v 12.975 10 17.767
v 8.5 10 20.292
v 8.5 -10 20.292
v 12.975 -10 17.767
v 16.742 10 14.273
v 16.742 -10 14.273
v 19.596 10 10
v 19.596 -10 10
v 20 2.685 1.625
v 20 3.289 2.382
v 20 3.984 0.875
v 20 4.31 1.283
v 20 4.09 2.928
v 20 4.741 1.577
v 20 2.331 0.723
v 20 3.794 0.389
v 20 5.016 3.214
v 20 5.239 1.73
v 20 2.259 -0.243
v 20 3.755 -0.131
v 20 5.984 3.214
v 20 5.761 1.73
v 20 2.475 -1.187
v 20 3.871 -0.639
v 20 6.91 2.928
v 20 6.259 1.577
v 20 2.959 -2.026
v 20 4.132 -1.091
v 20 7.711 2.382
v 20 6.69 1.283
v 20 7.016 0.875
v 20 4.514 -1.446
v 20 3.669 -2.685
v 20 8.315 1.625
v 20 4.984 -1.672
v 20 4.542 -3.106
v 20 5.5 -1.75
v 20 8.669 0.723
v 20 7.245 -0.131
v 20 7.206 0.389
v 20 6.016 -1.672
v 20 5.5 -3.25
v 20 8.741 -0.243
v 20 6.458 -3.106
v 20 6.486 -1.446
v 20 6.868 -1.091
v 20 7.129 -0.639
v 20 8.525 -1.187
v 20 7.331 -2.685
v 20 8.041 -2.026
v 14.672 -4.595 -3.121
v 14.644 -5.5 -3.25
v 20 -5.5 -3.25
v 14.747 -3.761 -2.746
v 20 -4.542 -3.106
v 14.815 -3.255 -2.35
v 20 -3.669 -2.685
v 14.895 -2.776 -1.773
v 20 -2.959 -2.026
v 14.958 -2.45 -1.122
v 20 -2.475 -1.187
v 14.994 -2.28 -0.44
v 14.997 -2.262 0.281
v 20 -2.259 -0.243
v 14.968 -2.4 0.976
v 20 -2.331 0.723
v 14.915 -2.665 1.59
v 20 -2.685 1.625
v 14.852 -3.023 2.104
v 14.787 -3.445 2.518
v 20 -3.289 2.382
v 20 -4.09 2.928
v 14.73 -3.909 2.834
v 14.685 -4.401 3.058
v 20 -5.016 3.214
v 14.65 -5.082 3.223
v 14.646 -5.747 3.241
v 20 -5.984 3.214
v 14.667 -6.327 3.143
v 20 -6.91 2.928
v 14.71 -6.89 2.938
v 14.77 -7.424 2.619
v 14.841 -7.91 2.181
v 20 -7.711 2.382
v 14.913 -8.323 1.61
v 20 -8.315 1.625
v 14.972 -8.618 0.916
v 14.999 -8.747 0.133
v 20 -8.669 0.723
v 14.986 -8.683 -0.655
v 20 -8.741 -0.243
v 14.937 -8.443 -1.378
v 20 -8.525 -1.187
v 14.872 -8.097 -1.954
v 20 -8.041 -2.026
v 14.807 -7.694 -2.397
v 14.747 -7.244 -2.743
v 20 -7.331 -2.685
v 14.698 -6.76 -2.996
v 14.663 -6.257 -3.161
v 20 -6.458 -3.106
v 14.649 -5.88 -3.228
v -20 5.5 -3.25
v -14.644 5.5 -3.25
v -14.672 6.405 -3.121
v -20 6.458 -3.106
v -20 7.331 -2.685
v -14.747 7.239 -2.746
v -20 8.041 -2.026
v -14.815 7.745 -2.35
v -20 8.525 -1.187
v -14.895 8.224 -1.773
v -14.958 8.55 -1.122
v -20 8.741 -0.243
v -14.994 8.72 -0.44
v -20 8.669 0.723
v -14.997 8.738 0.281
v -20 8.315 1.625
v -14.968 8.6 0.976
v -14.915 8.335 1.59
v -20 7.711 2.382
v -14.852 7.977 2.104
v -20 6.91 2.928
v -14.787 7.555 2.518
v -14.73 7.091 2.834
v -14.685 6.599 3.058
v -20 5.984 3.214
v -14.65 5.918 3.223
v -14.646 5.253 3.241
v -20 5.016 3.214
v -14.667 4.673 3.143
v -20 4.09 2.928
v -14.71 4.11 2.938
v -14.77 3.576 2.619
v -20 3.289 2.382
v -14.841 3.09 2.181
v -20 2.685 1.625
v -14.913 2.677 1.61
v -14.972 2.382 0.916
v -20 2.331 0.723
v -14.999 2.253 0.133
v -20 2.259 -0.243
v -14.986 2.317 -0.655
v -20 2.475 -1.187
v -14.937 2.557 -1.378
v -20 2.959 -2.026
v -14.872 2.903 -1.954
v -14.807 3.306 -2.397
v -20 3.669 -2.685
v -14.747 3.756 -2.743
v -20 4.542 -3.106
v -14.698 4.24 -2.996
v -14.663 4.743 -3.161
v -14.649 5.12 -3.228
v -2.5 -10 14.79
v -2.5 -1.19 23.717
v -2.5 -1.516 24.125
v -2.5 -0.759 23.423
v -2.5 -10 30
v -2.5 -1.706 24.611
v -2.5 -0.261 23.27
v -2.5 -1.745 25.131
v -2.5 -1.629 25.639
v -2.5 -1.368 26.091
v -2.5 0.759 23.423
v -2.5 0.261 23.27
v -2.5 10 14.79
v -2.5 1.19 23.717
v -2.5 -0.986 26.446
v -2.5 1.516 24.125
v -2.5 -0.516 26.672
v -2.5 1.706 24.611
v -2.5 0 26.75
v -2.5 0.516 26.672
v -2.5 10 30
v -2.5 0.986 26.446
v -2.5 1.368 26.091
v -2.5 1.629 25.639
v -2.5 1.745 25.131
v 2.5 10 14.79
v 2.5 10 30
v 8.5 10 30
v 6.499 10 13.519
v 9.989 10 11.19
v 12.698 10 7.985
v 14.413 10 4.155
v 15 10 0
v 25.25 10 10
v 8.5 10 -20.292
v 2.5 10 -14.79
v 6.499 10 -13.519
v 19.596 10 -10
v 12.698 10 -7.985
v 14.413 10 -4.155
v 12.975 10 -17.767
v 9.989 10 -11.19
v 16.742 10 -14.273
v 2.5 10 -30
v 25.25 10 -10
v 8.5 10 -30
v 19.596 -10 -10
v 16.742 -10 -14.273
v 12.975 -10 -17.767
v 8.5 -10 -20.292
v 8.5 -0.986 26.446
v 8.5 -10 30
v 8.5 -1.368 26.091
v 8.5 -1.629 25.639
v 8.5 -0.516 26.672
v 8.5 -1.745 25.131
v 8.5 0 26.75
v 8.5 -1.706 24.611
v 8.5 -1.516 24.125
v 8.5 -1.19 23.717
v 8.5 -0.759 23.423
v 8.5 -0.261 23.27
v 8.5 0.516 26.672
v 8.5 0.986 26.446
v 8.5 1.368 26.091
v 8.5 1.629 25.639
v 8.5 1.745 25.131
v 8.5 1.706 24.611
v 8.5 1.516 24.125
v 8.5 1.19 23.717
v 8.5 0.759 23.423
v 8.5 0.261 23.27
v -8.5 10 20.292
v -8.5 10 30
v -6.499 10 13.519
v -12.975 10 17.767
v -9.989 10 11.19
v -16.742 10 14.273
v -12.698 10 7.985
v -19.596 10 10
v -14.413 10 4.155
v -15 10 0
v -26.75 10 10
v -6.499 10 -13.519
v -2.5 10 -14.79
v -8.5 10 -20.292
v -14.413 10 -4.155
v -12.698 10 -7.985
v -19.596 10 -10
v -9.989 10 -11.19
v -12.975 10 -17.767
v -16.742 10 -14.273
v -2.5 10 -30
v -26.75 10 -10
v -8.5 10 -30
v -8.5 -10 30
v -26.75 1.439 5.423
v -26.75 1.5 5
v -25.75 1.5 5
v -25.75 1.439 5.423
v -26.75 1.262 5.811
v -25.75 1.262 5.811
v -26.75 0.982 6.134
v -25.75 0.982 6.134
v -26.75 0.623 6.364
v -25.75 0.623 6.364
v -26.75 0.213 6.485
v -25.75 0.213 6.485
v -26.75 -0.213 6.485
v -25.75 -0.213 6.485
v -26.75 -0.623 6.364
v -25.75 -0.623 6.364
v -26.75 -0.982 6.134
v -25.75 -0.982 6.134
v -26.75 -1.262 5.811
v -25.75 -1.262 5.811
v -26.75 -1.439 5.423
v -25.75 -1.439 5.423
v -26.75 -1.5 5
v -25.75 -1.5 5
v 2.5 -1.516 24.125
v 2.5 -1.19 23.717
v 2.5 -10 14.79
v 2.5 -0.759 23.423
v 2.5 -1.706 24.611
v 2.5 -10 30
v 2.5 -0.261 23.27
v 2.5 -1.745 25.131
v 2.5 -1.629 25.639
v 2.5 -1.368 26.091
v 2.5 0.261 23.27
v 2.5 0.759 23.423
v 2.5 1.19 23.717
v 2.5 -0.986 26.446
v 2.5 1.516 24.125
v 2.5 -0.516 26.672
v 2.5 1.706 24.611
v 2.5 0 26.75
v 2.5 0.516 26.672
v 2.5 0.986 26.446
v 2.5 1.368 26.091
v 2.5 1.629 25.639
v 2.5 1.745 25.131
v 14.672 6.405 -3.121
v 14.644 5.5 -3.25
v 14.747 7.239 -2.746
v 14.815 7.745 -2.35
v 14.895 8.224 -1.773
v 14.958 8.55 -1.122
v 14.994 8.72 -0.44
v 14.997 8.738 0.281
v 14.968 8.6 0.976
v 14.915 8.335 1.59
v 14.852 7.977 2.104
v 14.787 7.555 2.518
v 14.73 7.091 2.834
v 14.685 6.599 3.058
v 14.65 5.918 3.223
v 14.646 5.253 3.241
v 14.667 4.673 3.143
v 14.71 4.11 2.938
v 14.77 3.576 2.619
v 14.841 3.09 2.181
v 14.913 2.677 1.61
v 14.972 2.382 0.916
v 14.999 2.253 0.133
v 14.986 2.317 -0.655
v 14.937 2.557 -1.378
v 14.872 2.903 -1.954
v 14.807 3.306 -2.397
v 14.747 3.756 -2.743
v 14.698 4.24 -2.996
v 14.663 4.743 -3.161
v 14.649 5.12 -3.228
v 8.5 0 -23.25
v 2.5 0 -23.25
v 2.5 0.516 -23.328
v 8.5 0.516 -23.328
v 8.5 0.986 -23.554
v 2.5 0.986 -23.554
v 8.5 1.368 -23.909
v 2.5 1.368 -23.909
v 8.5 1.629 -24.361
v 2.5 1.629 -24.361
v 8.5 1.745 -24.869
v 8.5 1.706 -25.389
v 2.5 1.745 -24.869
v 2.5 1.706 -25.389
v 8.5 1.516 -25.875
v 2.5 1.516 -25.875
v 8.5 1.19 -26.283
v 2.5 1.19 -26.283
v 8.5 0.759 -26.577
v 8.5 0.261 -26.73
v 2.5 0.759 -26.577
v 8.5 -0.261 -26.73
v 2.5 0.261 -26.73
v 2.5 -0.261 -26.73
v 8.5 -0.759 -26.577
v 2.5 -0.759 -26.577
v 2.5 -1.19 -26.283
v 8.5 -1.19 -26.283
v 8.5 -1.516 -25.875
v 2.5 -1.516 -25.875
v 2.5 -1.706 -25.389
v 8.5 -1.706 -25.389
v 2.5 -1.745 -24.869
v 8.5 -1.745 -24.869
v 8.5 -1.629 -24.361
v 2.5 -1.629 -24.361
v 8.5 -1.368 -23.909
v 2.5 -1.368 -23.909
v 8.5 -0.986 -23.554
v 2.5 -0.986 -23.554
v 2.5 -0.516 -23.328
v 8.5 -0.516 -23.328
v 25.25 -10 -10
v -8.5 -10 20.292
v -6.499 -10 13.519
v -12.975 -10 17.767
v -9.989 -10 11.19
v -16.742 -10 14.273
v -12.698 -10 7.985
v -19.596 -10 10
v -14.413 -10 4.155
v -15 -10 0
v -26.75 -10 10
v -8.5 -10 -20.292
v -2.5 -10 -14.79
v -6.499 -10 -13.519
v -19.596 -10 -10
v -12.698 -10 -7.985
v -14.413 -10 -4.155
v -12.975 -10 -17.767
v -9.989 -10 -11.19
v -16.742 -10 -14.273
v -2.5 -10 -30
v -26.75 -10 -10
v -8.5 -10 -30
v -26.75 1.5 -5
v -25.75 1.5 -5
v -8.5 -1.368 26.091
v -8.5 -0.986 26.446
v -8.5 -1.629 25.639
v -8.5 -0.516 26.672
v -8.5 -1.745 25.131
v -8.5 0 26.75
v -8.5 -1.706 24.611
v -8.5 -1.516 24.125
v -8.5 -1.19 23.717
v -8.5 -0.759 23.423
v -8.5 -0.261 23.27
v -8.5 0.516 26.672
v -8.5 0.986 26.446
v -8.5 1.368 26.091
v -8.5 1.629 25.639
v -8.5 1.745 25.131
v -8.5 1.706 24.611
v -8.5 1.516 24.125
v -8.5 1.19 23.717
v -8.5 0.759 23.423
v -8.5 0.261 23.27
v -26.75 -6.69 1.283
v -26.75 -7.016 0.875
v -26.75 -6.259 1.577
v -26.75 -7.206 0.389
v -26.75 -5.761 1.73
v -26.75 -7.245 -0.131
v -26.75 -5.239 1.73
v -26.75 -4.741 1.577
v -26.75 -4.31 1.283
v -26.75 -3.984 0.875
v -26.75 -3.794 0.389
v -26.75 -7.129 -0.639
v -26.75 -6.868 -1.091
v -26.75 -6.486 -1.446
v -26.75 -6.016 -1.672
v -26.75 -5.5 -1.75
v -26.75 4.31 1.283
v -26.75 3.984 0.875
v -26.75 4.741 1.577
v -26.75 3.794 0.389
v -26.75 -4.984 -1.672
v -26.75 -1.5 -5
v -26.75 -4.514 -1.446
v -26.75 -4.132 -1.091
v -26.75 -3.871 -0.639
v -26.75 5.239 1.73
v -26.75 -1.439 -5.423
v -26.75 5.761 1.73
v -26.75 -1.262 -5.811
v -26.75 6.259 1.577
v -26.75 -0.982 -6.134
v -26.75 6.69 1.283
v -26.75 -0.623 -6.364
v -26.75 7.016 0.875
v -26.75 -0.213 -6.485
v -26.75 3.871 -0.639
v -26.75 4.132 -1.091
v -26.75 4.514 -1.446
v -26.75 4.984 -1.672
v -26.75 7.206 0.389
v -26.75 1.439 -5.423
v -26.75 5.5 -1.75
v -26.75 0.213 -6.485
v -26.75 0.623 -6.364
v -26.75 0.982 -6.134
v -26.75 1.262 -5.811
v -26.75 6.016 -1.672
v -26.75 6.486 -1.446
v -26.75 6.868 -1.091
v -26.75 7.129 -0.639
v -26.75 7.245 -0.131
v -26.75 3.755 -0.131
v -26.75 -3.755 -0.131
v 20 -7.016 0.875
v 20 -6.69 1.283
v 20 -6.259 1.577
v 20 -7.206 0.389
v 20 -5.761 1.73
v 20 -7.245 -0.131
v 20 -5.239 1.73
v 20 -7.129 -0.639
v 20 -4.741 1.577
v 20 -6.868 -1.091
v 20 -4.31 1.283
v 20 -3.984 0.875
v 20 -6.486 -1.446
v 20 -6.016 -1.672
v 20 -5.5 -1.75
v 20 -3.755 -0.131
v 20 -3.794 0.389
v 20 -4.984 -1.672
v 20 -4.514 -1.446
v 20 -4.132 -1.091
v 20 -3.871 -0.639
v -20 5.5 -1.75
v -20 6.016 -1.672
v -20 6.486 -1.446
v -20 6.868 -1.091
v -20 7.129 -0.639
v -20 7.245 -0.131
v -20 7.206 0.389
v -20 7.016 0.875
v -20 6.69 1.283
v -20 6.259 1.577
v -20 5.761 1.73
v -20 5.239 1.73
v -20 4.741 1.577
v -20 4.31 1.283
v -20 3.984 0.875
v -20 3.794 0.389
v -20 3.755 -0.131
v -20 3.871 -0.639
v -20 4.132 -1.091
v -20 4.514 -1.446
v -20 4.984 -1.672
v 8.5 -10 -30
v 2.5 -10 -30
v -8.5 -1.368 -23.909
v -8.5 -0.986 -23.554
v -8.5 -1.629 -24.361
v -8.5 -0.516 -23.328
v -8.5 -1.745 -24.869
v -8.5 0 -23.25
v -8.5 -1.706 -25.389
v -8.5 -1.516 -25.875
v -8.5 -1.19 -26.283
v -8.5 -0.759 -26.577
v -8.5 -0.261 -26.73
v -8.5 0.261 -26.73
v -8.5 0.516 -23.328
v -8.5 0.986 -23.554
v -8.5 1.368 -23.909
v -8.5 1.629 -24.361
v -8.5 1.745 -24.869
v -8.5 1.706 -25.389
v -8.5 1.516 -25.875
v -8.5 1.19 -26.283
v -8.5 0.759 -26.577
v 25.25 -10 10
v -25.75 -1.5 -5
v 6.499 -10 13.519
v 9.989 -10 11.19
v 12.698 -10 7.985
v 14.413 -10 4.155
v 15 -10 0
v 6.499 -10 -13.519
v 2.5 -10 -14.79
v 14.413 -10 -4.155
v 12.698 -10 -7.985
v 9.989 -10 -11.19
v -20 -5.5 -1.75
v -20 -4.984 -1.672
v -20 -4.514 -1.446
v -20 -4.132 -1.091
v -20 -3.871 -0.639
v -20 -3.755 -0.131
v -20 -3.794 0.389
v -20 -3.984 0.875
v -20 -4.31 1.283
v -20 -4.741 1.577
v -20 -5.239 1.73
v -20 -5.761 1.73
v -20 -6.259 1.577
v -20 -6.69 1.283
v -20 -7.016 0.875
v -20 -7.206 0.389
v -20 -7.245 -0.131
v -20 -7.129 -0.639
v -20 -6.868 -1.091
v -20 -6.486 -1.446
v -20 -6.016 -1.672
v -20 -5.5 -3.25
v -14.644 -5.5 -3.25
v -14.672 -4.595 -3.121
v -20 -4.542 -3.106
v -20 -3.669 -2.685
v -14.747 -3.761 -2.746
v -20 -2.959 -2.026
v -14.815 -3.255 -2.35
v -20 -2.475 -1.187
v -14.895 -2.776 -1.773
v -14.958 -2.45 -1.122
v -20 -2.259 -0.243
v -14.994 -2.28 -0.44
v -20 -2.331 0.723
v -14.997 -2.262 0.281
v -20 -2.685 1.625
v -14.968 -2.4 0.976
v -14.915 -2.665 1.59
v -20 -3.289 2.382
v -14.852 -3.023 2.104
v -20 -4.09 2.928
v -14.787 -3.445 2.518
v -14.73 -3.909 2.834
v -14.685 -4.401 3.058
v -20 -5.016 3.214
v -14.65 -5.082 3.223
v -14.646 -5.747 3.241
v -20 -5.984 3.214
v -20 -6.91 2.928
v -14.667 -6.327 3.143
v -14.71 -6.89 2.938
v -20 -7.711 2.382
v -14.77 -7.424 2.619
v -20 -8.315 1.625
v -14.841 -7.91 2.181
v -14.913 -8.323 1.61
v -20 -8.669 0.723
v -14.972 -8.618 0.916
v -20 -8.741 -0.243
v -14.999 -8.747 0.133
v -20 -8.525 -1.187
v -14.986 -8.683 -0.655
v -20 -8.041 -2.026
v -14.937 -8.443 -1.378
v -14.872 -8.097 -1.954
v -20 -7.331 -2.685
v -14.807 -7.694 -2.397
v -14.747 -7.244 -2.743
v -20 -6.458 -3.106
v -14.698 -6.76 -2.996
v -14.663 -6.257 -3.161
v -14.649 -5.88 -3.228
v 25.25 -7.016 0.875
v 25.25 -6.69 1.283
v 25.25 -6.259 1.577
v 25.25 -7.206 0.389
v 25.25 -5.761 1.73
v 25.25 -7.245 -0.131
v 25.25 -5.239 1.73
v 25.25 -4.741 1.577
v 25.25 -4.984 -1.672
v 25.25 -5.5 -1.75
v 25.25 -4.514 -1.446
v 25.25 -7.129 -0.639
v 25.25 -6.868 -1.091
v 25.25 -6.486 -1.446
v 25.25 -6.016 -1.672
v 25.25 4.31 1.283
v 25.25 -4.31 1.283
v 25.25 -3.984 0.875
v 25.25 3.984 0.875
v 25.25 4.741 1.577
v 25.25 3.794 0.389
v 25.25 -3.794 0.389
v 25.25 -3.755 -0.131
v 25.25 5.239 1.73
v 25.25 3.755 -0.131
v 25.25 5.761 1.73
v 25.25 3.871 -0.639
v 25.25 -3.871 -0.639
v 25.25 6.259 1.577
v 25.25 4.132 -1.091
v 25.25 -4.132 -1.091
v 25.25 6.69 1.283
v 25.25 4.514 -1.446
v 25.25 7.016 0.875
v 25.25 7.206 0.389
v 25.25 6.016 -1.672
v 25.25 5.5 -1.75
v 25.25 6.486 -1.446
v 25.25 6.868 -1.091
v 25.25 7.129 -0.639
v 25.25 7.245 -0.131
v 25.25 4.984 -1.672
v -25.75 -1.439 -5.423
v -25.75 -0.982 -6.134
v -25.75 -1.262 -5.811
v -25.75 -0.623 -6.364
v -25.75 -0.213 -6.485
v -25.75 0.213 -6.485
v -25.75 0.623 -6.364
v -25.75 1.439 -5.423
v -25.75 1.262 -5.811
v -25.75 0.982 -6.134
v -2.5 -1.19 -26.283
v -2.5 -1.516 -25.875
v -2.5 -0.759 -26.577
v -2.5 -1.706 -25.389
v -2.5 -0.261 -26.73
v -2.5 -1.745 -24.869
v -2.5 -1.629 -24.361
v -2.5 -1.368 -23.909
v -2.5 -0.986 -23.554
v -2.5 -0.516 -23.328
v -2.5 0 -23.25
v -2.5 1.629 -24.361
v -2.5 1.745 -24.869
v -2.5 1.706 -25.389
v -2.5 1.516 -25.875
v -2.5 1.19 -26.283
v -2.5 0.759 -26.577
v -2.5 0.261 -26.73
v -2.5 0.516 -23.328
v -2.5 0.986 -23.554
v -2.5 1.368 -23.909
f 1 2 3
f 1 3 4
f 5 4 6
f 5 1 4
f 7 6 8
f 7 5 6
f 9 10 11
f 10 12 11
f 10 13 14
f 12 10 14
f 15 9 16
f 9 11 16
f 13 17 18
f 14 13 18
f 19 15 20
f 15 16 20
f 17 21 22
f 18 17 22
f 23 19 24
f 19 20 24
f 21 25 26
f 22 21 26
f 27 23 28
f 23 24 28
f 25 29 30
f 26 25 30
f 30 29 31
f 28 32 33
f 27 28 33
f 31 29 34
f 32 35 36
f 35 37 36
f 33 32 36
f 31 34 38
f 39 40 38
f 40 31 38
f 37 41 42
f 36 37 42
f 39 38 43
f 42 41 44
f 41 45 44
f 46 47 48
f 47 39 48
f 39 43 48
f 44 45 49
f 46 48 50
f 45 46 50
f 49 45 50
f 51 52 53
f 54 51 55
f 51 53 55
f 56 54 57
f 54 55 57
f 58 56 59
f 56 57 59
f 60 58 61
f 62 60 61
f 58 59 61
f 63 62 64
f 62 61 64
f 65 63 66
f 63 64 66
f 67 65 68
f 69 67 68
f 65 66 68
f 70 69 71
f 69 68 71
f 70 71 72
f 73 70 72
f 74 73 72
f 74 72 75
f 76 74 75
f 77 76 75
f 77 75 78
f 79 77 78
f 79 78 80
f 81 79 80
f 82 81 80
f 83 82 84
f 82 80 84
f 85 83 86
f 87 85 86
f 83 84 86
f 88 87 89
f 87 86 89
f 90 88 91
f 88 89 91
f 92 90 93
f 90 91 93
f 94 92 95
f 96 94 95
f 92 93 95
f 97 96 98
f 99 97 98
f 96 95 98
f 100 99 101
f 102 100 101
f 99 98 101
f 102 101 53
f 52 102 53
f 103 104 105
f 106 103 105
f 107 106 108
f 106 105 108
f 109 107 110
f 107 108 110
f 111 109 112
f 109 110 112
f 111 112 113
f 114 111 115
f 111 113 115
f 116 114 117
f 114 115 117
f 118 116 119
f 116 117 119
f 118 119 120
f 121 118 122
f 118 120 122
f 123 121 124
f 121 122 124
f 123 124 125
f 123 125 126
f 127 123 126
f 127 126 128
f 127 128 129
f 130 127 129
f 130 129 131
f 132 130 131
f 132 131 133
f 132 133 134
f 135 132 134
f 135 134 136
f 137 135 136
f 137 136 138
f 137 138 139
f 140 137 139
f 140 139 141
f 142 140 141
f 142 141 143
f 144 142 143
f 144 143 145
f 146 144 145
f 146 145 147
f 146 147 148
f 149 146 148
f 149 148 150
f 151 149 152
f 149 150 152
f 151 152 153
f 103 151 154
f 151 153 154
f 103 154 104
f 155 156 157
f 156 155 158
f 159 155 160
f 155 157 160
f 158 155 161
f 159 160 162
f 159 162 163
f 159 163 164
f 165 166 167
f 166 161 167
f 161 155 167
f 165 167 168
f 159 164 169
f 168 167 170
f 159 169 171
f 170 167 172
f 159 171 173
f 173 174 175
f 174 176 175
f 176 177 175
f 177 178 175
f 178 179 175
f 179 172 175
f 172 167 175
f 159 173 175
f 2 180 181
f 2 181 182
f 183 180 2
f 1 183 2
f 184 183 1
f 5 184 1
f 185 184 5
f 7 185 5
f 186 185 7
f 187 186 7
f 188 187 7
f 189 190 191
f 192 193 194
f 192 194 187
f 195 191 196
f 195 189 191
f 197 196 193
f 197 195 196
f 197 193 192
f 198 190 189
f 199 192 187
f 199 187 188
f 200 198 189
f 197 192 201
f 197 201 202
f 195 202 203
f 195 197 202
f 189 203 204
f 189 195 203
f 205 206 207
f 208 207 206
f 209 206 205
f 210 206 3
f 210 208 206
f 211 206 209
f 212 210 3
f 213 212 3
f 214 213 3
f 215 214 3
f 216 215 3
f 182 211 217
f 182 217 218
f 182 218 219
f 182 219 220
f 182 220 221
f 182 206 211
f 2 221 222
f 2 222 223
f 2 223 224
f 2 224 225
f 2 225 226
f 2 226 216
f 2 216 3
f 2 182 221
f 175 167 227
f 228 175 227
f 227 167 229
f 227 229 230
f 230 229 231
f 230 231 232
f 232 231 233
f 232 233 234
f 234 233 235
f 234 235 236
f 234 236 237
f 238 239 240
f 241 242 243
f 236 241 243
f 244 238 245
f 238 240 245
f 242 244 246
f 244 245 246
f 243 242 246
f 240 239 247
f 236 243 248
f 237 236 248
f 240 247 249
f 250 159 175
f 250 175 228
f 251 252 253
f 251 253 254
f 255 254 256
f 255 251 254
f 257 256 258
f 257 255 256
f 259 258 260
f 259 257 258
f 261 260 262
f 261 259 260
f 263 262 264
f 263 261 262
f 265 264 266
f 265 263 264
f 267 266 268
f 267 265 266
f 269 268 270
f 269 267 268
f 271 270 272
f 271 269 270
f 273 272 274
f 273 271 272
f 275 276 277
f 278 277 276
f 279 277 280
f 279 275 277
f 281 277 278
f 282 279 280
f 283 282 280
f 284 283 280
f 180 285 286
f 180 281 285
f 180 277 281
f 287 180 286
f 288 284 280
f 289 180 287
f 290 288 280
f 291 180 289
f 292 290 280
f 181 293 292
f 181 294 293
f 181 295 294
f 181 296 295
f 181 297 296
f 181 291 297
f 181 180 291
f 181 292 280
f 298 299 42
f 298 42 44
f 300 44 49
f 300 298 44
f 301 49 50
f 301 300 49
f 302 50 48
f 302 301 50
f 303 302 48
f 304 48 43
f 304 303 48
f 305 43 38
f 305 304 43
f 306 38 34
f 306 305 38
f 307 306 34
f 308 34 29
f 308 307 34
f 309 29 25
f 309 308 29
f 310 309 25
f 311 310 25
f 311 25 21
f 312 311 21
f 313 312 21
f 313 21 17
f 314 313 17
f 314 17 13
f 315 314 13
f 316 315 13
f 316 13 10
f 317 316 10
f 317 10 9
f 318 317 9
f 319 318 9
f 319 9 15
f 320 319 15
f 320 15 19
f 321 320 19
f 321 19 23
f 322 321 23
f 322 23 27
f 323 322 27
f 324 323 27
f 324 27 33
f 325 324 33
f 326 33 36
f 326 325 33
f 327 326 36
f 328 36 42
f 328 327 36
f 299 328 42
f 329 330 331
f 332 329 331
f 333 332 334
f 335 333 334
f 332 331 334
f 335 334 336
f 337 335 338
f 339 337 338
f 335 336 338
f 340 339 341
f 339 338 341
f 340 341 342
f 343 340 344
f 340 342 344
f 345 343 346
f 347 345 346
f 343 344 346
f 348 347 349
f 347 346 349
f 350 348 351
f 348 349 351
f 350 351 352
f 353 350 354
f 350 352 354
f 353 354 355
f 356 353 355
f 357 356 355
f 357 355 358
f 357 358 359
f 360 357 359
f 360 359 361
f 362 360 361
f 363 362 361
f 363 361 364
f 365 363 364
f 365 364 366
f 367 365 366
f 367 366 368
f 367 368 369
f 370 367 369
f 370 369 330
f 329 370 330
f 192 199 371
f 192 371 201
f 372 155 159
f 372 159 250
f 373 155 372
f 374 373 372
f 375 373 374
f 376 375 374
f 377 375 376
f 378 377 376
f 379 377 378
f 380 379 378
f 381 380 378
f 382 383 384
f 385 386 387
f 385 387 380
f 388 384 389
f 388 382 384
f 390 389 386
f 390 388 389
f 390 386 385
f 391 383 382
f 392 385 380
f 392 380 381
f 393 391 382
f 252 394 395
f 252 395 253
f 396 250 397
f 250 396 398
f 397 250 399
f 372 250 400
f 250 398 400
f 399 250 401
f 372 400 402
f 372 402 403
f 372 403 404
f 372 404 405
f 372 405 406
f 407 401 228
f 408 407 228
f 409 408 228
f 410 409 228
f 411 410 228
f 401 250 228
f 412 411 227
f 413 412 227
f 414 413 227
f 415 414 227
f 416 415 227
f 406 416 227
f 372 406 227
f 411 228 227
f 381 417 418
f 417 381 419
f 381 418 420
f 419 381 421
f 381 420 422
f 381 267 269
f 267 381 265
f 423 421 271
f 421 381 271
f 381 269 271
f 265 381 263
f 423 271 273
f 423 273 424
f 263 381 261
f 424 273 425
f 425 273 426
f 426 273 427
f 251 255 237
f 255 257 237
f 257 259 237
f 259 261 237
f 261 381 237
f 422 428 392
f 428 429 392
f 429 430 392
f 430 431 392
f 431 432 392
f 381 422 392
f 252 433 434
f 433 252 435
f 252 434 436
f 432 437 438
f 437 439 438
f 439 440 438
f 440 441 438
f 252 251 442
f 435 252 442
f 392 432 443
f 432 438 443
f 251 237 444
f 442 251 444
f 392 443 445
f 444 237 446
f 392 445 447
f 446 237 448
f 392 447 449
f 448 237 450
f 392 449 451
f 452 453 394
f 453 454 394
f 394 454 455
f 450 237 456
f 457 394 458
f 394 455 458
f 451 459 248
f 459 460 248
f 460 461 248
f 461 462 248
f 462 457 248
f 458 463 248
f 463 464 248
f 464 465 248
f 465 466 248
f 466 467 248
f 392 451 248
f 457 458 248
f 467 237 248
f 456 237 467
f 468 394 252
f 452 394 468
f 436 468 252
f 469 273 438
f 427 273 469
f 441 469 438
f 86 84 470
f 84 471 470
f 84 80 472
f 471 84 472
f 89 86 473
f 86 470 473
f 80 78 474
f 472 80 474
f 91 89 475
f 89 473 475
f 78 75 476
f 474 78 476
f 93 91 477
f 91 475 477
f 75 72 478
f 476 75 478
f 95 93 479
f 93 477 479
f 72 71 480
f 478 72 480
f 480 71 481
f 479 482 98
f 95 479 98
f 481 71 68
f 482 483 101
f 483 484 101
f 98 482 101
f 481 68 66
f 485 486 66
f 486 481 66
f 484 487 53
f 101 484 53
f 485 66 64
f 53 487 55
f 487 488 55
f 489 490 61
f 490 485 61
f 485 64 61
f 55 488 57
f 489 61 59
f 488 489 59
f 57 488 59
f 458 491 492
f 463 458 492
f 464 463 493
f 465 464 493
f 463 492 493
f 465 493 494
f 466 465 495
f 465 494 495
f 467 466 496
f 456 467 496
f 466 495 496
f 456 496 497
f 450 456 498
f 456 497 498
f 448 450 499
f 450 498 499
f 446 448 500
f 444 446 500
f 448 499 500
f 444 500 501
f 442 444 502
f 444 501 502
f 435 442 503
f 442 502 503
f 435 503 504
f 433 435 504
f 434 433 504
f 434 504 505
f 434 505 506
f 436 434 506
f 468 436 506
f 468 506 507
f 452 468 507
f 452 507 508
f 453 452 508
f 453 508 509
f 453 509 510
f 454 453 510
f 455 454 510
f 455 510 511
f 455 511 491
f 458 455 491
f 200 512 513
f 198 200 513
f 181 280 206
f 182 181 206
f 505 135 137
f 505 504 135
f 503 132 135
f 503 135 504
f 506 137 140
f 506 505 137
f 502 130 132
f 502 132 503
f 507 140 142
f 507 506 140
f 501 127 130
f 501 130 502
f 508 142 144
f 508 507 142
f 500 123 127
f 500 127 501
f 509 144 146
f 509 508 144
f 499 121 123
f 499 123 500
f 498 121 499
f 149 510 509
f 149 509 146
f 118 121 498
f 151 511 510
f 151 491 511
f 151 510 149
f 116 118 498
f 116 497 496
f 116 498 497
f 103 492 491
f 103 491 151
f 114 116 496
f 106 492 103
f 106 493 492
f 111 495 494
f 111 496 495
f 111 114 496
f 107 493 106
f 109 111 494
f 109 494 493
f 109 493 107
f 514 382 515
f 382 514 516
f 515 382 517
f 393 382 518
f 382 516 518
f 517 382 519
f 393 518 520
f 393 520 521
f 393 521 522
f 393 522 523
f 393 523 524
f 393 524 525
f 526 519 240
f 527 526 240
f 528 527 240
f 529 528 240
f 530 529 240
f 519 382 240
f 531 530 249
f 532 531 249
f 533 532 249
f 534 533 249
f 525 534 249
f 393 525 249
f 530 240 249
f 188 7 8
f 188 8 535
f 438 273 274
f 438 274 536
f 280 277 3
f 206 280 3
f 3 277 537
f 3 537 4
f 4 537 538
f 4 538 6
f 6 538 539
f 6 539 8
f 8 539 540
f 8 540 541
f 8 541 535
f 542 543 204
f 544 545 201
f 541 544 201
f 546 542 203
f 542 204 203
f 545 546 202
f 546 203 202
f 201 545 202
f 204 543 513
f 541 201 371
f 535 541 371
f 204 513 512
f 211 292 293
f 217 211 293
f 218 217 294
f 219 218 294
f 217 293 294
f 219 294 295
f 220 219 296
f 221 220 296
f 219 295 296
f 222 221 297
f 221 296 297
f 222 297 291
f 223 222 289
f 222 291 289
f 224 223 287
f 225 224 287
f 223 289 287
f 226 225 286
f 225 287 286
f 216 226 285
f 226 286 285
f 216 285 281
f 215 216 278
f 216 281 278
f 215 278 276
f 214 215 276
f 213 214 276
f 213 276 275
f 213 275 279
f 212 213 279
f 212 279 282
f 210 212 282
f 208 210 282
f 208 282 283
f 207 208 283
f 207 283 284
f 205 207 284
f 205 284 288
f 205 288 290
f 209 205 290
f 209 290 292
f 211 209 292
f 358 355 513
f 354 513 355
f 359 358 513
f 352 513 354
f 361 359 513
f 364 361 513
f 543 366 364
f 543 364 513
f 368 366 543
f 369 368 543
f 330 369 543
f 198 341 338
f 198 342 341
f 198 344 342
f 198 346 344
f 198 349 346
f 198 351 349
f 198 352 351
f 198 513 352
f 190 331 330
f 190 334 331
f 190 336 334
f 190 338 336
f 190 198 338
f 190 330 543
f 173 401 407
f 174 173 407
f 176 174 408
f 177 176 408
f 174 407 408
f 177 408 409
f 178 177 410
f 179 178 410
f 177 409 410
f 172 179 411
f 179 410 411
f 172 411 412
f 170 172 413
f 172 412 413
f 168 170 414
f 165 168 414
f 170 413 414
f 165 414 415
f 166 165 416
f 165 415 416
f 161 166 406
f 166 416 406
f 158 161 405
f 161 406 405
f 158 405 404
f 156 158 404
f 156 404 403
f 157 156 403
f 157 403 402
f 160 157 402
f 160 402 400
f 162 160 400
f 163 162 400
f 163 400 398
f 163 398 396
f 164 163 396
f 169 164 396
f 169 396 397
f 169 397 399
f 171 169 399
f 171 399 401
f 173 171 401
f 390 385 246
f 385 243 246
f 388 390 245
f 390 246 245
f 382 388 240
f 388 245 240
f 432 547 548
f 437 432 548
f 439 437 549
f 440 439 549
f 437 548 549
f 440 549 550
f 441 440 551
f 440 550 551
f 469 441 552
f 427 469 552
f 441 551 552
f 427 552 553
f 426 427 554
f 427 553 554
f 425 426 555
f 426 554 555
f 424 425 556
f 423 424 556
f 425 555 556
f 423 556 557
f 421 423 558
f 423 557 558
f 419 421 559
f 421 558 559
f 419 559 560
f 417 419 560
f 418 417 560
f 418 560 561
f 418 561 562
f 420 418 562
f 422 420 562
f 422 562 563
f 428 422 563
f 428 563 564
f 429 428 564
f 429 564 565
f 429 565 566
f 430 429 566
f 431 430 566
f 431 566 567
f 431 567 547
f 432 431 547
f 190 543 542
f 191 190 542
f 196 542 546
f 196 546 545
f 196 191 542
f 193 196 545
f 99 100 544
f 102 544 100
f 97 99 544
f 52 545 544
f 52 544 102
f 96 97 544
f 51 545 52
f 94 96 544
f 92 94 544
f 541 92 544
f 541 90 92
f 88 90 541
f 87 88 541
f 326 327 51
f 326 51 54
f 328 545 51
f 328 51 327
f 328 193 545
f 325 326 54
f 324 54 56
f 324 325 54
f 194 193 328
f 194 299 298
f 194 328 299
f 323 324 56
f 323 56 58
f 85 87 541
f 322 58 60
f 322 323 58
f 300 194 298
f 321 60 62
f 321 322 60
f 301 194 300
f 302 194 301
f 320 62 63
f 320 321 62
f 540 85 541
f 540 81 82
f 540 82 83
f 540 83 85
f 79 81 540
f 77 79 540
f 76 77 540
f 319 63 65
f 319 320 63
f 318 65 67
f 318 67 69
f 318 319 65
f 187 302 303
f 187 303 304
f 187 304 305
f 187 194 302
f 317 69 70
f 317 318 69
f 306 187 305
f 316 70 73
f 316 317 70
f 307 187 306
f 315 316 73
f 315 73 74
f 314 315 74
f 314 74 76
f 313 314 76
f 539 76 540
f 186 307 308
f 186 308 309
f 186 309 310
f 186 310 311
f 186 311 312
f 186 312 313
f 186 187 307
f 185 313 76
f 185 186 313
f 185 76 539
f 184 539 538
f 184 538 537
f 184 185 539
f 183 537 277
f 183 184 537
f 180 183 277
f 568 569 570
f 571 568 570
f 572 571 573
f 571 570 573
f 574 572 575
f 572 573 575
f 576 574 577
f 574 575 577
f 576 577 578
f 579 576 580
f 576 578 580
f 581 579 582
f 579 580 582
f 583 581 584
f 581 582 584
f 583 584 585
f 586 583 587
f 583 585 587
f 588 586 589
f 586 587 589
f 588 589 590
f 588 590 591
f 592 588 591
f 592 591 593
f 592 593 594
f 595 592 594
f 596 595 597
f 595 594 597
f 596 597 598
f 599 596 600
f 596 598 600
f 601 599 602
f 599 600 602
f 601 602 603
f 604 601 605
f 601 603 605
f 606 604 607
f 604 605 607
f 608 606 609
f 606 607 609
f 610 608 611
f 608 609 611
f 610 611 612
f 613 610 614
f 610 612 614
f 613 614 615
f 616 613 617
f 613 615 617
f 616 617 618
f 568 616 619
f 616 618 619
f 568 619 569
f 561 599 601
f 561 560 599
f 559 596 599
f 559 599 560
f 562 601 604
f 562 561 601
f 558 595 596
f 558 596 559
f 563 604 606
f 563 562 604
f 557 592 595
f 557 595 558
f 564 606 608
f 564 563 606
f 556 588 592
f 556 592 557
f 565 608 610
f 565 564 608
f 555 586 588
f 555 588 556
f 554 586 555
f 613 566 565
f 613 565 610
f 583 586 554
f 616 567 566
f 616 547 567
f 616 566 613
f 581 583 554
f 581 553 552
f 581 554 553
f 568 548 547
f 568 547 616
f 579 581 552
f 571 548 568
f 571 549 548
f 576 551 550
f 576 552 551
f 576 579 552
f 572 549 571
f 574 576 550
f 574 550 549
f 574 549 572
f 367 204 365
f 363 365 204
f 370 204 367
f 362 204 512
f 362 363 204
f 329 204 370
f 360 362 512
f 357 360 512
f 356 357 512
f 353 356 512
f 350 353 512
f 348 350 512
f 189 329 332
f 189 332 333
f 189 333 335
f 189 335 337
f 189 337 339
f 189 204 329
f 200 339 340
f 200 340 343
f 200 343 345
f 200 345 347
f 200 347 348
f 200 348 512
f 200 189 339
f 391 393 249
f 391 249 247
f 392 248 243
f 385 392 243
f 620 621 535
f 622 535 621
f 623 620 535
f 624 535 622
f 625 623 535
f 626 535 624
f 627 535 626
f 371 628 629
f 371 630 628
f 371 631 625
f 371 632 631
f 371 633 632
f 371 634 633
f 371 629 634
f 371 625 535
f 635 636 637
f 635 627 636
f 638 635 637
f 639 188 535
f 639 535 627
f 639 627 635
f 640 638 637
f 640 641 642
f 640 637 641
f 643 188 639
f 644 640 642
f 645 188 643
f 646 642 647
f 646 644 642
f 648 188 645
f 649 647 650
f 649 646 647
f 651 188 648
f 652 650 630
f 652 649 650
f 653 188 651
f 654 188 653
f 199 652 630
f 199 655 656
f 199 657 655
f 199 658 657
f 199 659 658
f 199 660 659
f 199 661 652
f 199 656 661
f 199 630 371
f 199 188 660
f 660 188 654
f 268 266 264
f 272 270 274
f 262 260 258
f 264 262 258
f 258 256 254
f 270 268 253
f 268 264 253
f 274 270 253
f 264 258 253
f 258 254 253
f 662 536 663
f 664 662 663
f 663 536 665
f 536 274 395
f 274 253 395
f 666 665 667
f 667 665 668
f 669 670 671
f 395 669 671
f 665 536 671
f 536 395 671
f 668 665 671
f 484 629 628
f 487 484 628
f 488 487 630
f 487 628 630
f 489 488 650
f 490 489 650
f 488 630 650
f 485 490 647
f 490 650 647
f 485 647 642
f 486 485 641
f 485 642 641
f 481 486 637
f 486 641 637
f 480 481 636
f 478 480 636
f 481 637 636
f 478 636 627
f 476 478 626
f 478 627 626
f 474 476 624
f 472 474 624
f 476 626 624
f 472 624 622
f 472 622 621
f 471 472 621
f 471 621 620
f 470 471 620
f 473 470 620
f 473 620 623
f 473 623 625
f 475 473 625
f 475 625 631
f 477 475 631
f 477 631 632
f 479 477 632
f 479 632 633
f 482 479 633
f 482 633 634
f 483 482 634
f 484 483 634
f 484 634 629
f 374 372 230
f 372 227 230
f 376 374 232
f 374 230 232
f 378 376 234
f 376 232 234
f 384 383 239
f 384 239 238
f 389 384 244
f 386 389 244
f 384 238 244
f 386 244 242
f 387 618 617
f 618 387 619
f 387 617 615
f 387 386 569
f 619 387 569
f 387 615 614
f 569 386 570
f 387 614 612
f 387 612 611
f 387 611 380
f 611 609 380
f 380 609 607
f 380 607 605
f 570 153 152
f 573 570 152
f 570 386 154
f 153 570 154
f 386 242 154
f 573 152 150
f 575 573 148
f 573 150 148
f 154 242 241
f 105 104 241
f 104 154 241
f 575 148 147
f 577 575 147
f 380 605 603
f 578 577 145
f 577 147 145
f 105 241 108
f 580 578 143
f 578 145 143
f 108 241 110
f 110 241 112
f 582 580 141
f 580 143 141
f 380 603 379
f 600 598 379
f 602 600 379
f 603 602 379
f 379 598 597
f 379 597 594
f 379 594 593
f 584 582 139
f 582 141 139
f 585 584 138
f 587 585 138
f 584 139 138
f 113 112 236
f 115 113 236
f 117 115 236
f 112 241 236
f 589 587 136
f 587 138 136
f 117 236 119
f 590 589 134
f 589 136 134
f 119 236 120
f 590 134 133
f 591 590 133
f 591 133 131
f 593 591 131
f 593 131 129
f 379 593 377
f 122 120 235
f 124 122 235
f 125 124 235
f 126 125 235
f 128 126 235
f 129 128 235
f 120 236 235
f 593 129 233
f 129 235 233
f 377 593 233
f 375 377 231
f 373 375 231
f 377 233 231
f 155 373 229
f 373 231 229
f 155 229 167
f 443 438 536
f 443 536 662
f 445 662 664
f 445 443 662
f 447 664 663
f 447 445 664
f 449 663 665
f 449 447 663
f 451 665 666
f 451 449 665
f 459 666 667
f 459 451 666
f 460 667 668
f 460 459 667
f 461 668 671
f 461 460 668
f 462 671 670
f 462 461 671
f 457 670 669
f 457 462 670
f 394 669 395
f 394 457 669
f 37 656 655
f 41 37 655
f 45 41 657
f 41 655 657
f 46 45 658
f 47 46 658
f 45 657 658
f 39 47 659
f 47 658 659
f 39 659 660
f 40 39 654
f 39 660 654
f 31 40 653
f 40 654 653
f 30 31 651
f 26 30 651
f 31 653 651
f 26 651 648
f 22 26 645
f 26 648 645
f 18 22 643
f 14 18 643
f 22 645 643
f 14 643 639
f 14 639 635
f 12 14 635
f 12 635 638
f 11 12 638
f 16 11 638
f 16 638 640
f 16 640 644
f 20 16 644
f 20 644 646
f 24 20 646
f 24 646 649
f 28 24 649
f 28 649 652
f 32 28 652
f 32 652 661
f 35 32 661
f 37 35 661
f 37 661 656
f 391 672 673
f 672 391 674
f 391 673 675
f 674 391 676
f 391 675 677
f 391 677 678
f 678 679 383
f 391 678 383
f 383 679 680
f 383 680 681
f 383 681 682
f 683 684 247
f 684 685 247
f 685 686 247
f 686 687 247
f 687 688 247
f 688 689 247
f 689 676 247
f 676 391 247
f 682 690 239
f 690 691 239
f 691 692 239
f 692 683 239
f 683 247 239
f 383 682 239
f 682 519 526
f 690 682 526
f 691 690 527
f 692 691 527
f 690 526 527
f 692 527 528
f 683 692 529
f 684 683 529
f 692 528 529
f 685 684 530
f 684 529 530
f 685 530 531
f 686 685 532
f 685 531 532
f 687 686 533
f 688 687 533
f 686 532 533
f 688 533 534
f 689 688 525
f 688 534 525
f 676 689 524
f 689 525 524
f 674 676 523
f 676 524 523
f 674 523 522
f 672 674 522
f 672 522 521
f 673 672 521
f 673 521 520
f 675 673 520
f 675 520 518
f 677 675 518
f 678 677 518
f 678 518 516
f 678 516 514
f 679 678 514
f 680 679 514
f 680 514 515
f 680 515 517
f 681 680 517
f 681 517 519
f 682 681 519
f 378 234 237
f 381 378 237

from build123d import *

# Parameters (mm, degrees)
EXTRUDE_1_DEPTH     = 10
EXTRUDE_1_2_DEPTH   = 10
SKETCH_3_R          = 1.75
CUT_EXTRUDE_1_DEPTH = 100
SKETCH_4_R          = 3.25
CUT_EXTRUDE_2_DEPTH = 20
SKETCH_5_R          = 1.75
CUT_EXTRUDE_3_DEPTH = 40
CUT_EXTRUDE_4_DEPTH = 1


with BuildPart() as part:
    # 草图1 → 凸台-拉伸1 (new, symmetric)
    with BuildSketch(Plane(origin=(0, 0, 0), x_dir=(1, 0, 0), z_dir=(0, 1, 0))):
        with BuildLine():
            Line((-26.75, 10), (-19.595917942, 10))
            ThreePointArc((-19.595917942, 10), (-14.960766418, 16.129955616), (-8.5, 20.291623888))
            Line((-8.5, 20.291623888), (-8.5, 30))
            Line((-8.5, 30), (-2.5, 30))
            Line((-2.5, 30), (-2.5, 14.790199458))
            ThreePointArc((-2.5, 14.790199458), (-15, 0), (-2.5, -14.790199458))
            Line((-2.5, -14.790199458), (-2.5, -30))
            Line((-2.5, -30), (-8.5, -30))
            Line((-8.5, -30), (-8.5, -20.291623888))
            ThreePointArc((-8.5, -20.291623888), (-14.960766418, -16.129955616), (-19.595917942, -10))
            Line((-19.595917942, -10), (-26.75, -10))
            Line((-26.75, -10), (-26.75, 10))
        make_face()
    extrude(amount=EXTRUDE_1_DEPTH, both=True)


with BuildPart() as body_2:
    # 草图1 → Extrude 1 2 (new, symmetric)
    with BuildSketch(Plane(origin=(0, 0, 0), x_dir=(1, 0, 0), z_dir=(0, 1, 0))):
        with BuildLine():
            Line((2.5, 30), (2.5, 14.790199458))
            ThreePointArc((2.5, 14.790199458), (15, 0), (2.5, -14.790199458))
            Line((2.5, -14.790199458), (2.5, -30))
            Line((2.5, -30), (8.5, -30))
            Line((8.5, -30), (8.5, -20.291623888))
            ThreePointArc((8.5, -20.291623888), (14.960766418, -16.129955616), (19.595917942, -10))
            Line((19.595917942, -10), (25.25, -10))
            Line((25.25, -10), (25.25, 10))
            Line((25.25, 10), (19.595917942, 10))
            ThreePointArc((19.595917942, 10), (14.960766418, 16.129955616), (8.5, 20.291623888))
            Line((8.5, 20.291623888), (8.5, 30))
            Line((8.5, 30), (2.5, 30))
        make_face()
    extrude(amount=EXTRUDE_1_2_DEPTH, both=True)


with BuildPart() as cut_extrude_1_tool:
    # 草图3 → 切除-拉伸1 (new body)
    with BuildSketch(Plane(origin=(25.25, 0, 0), x_dir=(0, 0, -1), z_dir=(1, 0, 0))):
        with Locations((0, 5.5)):
            Circle(SKETCH_3_R)
        with Locations((0, -5.5)):
            Circle(SKETCH_3_R)
    extrude(amount=-CUT_EXTRUDE_1_DEPTH)


with BuildPart() as part_1:
    add(part.part)

    # 切除-拉伸1: cut by cut_extrude_1_tool
    add(cut_extrude_1_tool.part, mode=Mode.SUBTRACT)


with BuildPart() as body_2_1:
    add(body_2.part)

    # 切除-拉伸1: cut by cut_extrude_1_tool
    add(cut_extrude_1_tool.part, mode=Mode.SUBTRACT)


with BuildPart() as cut_extrude_2_tool:
    # 草图4 → 切除-拉伸2 (new, symmetric)
    with BuildSketch(Plane(origin=(0, 0, 0), x_dir=(0, 0, -1), z_dir=(1, 0, 0))):
        with Locations((0, 5.5)):
            Circle(SKETCH_4_R)
        with Locations((0, -5.5)):
            Circle(SKETCH_4_R)
    extrude(amount=CUT_EXTRUDE_2_DEPTH, both=True)


with BuildPart() as part_2:
    add(part_1.part)

    # 切除-拉伸2: cut by cut_extrude_2_tool
    add(cut_extrude_2_tool.part, mode=Mode.SUBTRACT)


with BuildPart() as body_2_2:
    add(body_2_1.part)

    # 切除-拉伸2: cut by cut_extrude_2_tool
    add(cut_extrude_2_tool.part, mode=Mode.SUBTRACT)


with BuildPart() as cut_extrude_3_tool:
    # 草图5 → 切除-拉伸3 (new body)
    with BuildSketch(Plane.ZY.offset(8.5)):
        with Locations((-25, 0)):
            Circle(SKETCH_5_R)
        with Locations((25, 0)):
            Circle(SKETCH_5_R)
    extrude(amount=-CUT_EXTRUDE_3_DEPTH)


with BuildPart() as part_3:
    add(part_2.part)

    # 切除-拉伸3: cut by cut_extrude_3_tool
    add(cut_extrude_3_tool.part, mode=Mode.SUBTRACT)

    # 草图6 → 切除-拉伸4 (cut)
    with BuildSketch(Plane.ZY.offset(26.75)):
        with BuildLine():
            Line((-5, 1.5), (5, 1.5))
            ThreePointArc((5, 1.5), (6.5, 0), (5, -1.5))
            Line((5, -1.5), (-5, -1.5))
            ThreePointArc((-5, -1.5), (-6.5, 0), (-5, 1.5))
        make_face()
    extrude(amount=-CUT_EXTRUDE_4_DEPTH, mode=Mode.SUBTRACT)


with BuildPart() as body_2_3:
    add(body_2_2.part)

    # 切除-拉伸3: cut by cut_extrude_3_tool
    add(cut_extrude_3_tool.part, mode=Mode.SUBTRACT)


solid = Compound([part_3.part, body_2_3.part])
